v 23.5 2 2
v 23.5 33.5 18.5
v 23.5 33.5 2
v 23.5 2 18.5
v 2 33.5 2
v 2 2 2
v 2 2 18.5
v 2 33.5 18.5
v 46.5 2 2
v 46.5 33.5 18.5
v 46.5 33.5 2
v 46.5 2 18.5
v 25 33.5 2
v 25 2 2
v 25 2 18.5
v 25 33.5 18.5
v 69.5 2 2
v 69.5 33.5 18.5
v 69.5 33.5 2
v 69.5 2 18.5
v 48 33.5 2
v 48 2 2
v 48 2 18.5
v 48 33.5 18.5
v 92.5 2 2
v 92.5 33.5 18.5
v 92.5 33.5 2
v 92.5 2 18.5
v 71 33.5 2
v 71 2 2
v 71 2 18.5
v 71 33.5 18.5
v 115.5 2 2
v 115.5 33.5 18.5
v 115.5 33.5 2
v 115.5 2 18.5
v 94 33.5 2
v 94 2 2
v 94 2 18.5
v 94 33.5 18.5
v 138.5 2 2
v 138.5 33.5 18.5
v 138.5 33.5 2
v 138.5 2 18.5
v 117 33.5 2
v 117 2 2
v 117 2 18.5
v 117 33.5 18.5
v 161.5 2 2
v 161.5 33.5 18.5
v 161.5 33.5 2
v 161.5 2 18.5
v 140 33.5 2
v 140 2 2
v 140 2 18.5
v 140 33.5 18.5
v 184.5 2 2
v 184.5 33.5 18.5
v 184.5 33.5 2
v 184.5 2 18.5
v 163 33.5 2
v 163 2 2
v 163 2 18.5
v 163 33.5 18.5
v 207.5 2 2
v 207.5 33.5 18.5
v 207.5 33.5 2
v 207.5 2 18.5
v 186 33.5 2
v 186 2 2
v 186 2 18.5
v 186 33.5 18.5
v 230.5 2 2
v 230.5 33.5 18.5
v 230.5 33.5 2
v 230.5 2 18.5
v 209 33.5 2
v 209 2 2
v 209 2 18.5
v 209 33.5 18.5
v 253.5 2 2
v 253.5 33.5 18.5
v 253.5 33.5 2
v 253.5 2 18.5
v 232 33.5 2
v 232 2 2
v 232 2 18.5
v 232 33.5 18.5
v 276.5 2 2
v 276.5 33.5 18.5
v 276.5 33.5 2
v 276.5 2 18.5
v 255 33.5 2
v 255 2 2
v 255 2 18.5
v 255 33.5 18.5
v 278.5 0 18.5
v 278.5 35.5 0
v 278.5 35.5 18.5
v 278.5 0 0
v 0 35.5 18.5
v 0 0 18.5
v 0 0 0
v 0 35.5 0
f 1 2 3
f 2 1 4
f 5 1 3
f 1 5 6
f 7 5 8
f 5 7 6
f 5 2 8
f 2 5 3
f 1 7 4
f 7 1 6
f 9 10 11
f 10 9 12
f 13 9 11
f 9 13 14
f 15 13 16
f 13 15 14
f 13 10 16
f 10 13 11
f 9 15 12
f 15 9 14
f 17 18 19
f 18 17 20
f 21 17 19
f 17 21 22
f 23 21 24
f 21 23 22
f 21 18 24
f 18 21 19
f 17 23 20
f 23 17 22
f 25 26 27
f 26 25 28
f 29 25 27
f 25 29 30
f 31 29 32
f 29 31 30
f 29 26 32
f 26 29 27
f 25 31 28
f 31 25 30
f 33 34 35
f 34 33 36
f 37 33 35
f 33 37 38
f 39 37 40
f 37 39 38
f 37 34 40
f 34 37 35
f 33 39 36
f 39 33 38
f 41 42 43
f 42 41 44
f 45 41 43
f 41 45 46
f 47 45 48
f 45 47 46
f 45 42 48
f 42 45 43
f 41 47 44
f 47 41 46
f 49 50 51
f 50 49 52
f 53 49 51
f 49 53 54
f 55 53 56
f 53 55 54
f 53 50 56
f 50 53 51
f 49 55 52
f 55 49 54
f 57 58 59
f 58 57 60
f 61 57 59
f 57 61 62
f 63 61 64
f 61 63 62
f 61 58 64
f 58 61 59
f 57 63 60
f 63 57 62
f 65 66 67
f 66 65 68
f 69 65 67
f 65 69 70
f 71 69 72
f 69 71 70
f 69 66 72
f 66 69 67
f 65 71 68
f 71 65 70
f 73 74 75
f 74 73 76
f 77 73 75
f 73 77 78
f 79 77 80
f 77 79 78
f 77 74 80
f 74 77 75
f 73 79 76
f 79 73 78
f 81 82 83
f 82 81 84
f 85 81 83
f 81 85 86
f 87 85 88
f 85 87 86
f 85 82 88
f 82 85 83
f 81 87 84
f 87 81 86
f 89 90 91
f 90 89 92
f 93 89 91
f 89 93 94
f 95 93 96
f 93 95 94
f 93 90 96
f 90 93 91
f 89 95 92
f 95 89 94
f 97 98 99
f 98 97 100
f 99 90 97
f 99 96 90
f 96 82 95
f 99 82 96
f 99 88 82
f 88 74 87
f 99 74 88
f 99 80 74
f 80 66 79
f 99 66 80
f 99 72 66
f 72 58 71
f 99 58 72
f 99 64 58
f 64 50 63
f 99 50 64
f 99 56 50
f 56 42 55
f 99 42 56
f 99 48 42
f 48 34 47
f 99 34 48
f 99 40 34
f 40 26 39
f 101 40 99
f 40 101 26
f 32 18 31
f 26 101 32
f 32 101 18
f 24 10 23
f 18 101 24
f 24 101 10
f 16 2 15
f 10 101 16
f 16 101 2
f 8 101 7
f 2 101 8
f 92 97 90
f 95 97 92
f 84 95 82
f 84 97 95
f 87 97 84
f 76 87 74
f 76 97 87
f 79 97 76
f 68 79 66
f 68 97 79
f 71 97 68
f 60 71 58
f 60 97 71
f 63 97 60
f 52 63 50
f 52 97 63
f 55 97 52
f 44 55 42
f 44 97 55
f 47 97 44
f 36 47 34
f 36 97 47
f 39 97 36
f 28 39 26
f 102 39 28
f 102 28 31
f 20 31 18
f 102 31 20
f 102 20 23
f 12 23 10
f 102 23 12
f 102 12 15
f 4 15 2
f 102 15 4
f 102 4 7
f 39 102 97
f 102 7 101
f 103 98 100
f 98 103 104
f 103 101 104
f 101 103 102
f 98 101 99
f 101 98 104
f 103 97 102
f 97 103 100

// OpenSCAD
// Generated by SolidPython 1.1.3 on 2026-02-21 17:48:05


difference() {
	cube(size = [278.5000000000, 35.5000000000, 18.5000000000]);
	union() {
		translate(v = [2.0000000000, 2.0000000000, 2.0000000000]) {
			cube(size = [21.5000000000, 31.5000000000, 16.5100000000]);
		}
		translate(v = [25.0000000000, 2.0000000000, 2.0000000000]) {
			cube(size = [21.5000000000, 31.5000000000, 16.5100000000]);
		}
		translate(v = [48.0000000000, 2.0000000000, 2.0000000000]) {
			cube(size = [21.5000000000, 31.5000000000, 16.5100000000]);
		}
		translate(v = [71.0000000000, 2.0000000000, 2.0000000000]) {
			cube(size = [21.5000000000, 31.5000000000, 16.5100000000]);
		}
		translate(v = [94.0000000000, 2.0000000000, 2.0000000000]) {
			cube(size = [21.5000000000, 31.5000000000, 16.5100000000]);
		}
		translate(v = [117.0000000000, 2.0000000000, 2.0000000000]) {
			cube(size = [21.5000000000, 31.5000000000, 16.5100000000]);
		}
		translate(v = [140.0000000000, 2.0000000000, 2.0000000000]) {
			cube(size = [21.5000000000, 31.5000000000, 16.5100000000]);
		}
		translate(v = [163.0000000000, 2.0000000000, 2.0000000000]) {
			cube(size = [21.5000000000, 31.5000000000, 16.5100000000]);
		}
		translate(v = [186.0000000000, 2.0000000000, 2.0000000000]) {
			cube(size = [21.5000000000, 31.5000000000, 16.5100000000]);
		}
		translate(v = [209.0000000000, 2.0000000000, 2.0000000000]) {
			cube(size = [21.5000000000, 31.5000000000, 16.5100000000]);
		}
		translate(v = [232.0000000000, 2.0000000000, 2.0000000000]) {
			cube(size = [21.5000000000, 31.5000000000, 16.5100000000]);
		}
		translate(v = [255.0000000000, 2.0000000000, 2.0000000000]) {
			cube(size = [21.5000000000, 31.5000000000, 16.5100000000]);
		}
	}
}
/***********************************************
*********      SolidPython code:      **********
************************************************
 
"""SolidPython geometry building for storage cases."""

from typing import List, Union

from solid import cube, difference, scad_render_to_file, translate, union

from .config import Config
from .layout import GridLayoutResult, MixedLayoutResult, SlotRect


def build_base_tray(
    slots: List[SlotRect],
    total_width: float,
    total_length: float,
    config: Config,
):
    """Build the solid base tray (floor + perimeter walls) with slot cavities subtracted."""
    wall = config.wall_thickness
    base_h = config.base_height
    max_height = max(s.height for s in slots)

    outer_x = total_width + 2 * wall
    outer_y = total_length + 2 * wall
    outer_z = base_h + max_height

    outer_box = cube([outer_x, outer_y, outer_z])

    # Subtract each slot cavity
    cavities = []
    for slot in slots:
        cavity = translate([wall + slot.x, wall + slot.y, base_h])(
            cube([slot.width, slot.length, slot.height + 0.01])  # +epsilon for clean cut
        )
        cavities.append(cavity)

    if cavities:
        tray = difference()(outer_box, union()(*cavities))
    else:
        tray = outer_box

    return tray


def assemble_case(
    layout_result: Union[GridLayoutResult, MixedLayoutResult],
    config: Config,
):
    """Assemble the complete case: base tray with slot cavities (dividers are implicit)."""
    slots = layout_result.slots
    total_width = layout_result.total_width
    total_length = layout_result.total_length

    case = build_base_tray(slots, total_width, total_length, config)
    return case


def render_to_file(assembly, filepath: str) -> None:
    """Render the assembly to an OpenSCAD .scad file."""
    scad_render_to_file(assembly, filepath)
 
 
************************************************/
